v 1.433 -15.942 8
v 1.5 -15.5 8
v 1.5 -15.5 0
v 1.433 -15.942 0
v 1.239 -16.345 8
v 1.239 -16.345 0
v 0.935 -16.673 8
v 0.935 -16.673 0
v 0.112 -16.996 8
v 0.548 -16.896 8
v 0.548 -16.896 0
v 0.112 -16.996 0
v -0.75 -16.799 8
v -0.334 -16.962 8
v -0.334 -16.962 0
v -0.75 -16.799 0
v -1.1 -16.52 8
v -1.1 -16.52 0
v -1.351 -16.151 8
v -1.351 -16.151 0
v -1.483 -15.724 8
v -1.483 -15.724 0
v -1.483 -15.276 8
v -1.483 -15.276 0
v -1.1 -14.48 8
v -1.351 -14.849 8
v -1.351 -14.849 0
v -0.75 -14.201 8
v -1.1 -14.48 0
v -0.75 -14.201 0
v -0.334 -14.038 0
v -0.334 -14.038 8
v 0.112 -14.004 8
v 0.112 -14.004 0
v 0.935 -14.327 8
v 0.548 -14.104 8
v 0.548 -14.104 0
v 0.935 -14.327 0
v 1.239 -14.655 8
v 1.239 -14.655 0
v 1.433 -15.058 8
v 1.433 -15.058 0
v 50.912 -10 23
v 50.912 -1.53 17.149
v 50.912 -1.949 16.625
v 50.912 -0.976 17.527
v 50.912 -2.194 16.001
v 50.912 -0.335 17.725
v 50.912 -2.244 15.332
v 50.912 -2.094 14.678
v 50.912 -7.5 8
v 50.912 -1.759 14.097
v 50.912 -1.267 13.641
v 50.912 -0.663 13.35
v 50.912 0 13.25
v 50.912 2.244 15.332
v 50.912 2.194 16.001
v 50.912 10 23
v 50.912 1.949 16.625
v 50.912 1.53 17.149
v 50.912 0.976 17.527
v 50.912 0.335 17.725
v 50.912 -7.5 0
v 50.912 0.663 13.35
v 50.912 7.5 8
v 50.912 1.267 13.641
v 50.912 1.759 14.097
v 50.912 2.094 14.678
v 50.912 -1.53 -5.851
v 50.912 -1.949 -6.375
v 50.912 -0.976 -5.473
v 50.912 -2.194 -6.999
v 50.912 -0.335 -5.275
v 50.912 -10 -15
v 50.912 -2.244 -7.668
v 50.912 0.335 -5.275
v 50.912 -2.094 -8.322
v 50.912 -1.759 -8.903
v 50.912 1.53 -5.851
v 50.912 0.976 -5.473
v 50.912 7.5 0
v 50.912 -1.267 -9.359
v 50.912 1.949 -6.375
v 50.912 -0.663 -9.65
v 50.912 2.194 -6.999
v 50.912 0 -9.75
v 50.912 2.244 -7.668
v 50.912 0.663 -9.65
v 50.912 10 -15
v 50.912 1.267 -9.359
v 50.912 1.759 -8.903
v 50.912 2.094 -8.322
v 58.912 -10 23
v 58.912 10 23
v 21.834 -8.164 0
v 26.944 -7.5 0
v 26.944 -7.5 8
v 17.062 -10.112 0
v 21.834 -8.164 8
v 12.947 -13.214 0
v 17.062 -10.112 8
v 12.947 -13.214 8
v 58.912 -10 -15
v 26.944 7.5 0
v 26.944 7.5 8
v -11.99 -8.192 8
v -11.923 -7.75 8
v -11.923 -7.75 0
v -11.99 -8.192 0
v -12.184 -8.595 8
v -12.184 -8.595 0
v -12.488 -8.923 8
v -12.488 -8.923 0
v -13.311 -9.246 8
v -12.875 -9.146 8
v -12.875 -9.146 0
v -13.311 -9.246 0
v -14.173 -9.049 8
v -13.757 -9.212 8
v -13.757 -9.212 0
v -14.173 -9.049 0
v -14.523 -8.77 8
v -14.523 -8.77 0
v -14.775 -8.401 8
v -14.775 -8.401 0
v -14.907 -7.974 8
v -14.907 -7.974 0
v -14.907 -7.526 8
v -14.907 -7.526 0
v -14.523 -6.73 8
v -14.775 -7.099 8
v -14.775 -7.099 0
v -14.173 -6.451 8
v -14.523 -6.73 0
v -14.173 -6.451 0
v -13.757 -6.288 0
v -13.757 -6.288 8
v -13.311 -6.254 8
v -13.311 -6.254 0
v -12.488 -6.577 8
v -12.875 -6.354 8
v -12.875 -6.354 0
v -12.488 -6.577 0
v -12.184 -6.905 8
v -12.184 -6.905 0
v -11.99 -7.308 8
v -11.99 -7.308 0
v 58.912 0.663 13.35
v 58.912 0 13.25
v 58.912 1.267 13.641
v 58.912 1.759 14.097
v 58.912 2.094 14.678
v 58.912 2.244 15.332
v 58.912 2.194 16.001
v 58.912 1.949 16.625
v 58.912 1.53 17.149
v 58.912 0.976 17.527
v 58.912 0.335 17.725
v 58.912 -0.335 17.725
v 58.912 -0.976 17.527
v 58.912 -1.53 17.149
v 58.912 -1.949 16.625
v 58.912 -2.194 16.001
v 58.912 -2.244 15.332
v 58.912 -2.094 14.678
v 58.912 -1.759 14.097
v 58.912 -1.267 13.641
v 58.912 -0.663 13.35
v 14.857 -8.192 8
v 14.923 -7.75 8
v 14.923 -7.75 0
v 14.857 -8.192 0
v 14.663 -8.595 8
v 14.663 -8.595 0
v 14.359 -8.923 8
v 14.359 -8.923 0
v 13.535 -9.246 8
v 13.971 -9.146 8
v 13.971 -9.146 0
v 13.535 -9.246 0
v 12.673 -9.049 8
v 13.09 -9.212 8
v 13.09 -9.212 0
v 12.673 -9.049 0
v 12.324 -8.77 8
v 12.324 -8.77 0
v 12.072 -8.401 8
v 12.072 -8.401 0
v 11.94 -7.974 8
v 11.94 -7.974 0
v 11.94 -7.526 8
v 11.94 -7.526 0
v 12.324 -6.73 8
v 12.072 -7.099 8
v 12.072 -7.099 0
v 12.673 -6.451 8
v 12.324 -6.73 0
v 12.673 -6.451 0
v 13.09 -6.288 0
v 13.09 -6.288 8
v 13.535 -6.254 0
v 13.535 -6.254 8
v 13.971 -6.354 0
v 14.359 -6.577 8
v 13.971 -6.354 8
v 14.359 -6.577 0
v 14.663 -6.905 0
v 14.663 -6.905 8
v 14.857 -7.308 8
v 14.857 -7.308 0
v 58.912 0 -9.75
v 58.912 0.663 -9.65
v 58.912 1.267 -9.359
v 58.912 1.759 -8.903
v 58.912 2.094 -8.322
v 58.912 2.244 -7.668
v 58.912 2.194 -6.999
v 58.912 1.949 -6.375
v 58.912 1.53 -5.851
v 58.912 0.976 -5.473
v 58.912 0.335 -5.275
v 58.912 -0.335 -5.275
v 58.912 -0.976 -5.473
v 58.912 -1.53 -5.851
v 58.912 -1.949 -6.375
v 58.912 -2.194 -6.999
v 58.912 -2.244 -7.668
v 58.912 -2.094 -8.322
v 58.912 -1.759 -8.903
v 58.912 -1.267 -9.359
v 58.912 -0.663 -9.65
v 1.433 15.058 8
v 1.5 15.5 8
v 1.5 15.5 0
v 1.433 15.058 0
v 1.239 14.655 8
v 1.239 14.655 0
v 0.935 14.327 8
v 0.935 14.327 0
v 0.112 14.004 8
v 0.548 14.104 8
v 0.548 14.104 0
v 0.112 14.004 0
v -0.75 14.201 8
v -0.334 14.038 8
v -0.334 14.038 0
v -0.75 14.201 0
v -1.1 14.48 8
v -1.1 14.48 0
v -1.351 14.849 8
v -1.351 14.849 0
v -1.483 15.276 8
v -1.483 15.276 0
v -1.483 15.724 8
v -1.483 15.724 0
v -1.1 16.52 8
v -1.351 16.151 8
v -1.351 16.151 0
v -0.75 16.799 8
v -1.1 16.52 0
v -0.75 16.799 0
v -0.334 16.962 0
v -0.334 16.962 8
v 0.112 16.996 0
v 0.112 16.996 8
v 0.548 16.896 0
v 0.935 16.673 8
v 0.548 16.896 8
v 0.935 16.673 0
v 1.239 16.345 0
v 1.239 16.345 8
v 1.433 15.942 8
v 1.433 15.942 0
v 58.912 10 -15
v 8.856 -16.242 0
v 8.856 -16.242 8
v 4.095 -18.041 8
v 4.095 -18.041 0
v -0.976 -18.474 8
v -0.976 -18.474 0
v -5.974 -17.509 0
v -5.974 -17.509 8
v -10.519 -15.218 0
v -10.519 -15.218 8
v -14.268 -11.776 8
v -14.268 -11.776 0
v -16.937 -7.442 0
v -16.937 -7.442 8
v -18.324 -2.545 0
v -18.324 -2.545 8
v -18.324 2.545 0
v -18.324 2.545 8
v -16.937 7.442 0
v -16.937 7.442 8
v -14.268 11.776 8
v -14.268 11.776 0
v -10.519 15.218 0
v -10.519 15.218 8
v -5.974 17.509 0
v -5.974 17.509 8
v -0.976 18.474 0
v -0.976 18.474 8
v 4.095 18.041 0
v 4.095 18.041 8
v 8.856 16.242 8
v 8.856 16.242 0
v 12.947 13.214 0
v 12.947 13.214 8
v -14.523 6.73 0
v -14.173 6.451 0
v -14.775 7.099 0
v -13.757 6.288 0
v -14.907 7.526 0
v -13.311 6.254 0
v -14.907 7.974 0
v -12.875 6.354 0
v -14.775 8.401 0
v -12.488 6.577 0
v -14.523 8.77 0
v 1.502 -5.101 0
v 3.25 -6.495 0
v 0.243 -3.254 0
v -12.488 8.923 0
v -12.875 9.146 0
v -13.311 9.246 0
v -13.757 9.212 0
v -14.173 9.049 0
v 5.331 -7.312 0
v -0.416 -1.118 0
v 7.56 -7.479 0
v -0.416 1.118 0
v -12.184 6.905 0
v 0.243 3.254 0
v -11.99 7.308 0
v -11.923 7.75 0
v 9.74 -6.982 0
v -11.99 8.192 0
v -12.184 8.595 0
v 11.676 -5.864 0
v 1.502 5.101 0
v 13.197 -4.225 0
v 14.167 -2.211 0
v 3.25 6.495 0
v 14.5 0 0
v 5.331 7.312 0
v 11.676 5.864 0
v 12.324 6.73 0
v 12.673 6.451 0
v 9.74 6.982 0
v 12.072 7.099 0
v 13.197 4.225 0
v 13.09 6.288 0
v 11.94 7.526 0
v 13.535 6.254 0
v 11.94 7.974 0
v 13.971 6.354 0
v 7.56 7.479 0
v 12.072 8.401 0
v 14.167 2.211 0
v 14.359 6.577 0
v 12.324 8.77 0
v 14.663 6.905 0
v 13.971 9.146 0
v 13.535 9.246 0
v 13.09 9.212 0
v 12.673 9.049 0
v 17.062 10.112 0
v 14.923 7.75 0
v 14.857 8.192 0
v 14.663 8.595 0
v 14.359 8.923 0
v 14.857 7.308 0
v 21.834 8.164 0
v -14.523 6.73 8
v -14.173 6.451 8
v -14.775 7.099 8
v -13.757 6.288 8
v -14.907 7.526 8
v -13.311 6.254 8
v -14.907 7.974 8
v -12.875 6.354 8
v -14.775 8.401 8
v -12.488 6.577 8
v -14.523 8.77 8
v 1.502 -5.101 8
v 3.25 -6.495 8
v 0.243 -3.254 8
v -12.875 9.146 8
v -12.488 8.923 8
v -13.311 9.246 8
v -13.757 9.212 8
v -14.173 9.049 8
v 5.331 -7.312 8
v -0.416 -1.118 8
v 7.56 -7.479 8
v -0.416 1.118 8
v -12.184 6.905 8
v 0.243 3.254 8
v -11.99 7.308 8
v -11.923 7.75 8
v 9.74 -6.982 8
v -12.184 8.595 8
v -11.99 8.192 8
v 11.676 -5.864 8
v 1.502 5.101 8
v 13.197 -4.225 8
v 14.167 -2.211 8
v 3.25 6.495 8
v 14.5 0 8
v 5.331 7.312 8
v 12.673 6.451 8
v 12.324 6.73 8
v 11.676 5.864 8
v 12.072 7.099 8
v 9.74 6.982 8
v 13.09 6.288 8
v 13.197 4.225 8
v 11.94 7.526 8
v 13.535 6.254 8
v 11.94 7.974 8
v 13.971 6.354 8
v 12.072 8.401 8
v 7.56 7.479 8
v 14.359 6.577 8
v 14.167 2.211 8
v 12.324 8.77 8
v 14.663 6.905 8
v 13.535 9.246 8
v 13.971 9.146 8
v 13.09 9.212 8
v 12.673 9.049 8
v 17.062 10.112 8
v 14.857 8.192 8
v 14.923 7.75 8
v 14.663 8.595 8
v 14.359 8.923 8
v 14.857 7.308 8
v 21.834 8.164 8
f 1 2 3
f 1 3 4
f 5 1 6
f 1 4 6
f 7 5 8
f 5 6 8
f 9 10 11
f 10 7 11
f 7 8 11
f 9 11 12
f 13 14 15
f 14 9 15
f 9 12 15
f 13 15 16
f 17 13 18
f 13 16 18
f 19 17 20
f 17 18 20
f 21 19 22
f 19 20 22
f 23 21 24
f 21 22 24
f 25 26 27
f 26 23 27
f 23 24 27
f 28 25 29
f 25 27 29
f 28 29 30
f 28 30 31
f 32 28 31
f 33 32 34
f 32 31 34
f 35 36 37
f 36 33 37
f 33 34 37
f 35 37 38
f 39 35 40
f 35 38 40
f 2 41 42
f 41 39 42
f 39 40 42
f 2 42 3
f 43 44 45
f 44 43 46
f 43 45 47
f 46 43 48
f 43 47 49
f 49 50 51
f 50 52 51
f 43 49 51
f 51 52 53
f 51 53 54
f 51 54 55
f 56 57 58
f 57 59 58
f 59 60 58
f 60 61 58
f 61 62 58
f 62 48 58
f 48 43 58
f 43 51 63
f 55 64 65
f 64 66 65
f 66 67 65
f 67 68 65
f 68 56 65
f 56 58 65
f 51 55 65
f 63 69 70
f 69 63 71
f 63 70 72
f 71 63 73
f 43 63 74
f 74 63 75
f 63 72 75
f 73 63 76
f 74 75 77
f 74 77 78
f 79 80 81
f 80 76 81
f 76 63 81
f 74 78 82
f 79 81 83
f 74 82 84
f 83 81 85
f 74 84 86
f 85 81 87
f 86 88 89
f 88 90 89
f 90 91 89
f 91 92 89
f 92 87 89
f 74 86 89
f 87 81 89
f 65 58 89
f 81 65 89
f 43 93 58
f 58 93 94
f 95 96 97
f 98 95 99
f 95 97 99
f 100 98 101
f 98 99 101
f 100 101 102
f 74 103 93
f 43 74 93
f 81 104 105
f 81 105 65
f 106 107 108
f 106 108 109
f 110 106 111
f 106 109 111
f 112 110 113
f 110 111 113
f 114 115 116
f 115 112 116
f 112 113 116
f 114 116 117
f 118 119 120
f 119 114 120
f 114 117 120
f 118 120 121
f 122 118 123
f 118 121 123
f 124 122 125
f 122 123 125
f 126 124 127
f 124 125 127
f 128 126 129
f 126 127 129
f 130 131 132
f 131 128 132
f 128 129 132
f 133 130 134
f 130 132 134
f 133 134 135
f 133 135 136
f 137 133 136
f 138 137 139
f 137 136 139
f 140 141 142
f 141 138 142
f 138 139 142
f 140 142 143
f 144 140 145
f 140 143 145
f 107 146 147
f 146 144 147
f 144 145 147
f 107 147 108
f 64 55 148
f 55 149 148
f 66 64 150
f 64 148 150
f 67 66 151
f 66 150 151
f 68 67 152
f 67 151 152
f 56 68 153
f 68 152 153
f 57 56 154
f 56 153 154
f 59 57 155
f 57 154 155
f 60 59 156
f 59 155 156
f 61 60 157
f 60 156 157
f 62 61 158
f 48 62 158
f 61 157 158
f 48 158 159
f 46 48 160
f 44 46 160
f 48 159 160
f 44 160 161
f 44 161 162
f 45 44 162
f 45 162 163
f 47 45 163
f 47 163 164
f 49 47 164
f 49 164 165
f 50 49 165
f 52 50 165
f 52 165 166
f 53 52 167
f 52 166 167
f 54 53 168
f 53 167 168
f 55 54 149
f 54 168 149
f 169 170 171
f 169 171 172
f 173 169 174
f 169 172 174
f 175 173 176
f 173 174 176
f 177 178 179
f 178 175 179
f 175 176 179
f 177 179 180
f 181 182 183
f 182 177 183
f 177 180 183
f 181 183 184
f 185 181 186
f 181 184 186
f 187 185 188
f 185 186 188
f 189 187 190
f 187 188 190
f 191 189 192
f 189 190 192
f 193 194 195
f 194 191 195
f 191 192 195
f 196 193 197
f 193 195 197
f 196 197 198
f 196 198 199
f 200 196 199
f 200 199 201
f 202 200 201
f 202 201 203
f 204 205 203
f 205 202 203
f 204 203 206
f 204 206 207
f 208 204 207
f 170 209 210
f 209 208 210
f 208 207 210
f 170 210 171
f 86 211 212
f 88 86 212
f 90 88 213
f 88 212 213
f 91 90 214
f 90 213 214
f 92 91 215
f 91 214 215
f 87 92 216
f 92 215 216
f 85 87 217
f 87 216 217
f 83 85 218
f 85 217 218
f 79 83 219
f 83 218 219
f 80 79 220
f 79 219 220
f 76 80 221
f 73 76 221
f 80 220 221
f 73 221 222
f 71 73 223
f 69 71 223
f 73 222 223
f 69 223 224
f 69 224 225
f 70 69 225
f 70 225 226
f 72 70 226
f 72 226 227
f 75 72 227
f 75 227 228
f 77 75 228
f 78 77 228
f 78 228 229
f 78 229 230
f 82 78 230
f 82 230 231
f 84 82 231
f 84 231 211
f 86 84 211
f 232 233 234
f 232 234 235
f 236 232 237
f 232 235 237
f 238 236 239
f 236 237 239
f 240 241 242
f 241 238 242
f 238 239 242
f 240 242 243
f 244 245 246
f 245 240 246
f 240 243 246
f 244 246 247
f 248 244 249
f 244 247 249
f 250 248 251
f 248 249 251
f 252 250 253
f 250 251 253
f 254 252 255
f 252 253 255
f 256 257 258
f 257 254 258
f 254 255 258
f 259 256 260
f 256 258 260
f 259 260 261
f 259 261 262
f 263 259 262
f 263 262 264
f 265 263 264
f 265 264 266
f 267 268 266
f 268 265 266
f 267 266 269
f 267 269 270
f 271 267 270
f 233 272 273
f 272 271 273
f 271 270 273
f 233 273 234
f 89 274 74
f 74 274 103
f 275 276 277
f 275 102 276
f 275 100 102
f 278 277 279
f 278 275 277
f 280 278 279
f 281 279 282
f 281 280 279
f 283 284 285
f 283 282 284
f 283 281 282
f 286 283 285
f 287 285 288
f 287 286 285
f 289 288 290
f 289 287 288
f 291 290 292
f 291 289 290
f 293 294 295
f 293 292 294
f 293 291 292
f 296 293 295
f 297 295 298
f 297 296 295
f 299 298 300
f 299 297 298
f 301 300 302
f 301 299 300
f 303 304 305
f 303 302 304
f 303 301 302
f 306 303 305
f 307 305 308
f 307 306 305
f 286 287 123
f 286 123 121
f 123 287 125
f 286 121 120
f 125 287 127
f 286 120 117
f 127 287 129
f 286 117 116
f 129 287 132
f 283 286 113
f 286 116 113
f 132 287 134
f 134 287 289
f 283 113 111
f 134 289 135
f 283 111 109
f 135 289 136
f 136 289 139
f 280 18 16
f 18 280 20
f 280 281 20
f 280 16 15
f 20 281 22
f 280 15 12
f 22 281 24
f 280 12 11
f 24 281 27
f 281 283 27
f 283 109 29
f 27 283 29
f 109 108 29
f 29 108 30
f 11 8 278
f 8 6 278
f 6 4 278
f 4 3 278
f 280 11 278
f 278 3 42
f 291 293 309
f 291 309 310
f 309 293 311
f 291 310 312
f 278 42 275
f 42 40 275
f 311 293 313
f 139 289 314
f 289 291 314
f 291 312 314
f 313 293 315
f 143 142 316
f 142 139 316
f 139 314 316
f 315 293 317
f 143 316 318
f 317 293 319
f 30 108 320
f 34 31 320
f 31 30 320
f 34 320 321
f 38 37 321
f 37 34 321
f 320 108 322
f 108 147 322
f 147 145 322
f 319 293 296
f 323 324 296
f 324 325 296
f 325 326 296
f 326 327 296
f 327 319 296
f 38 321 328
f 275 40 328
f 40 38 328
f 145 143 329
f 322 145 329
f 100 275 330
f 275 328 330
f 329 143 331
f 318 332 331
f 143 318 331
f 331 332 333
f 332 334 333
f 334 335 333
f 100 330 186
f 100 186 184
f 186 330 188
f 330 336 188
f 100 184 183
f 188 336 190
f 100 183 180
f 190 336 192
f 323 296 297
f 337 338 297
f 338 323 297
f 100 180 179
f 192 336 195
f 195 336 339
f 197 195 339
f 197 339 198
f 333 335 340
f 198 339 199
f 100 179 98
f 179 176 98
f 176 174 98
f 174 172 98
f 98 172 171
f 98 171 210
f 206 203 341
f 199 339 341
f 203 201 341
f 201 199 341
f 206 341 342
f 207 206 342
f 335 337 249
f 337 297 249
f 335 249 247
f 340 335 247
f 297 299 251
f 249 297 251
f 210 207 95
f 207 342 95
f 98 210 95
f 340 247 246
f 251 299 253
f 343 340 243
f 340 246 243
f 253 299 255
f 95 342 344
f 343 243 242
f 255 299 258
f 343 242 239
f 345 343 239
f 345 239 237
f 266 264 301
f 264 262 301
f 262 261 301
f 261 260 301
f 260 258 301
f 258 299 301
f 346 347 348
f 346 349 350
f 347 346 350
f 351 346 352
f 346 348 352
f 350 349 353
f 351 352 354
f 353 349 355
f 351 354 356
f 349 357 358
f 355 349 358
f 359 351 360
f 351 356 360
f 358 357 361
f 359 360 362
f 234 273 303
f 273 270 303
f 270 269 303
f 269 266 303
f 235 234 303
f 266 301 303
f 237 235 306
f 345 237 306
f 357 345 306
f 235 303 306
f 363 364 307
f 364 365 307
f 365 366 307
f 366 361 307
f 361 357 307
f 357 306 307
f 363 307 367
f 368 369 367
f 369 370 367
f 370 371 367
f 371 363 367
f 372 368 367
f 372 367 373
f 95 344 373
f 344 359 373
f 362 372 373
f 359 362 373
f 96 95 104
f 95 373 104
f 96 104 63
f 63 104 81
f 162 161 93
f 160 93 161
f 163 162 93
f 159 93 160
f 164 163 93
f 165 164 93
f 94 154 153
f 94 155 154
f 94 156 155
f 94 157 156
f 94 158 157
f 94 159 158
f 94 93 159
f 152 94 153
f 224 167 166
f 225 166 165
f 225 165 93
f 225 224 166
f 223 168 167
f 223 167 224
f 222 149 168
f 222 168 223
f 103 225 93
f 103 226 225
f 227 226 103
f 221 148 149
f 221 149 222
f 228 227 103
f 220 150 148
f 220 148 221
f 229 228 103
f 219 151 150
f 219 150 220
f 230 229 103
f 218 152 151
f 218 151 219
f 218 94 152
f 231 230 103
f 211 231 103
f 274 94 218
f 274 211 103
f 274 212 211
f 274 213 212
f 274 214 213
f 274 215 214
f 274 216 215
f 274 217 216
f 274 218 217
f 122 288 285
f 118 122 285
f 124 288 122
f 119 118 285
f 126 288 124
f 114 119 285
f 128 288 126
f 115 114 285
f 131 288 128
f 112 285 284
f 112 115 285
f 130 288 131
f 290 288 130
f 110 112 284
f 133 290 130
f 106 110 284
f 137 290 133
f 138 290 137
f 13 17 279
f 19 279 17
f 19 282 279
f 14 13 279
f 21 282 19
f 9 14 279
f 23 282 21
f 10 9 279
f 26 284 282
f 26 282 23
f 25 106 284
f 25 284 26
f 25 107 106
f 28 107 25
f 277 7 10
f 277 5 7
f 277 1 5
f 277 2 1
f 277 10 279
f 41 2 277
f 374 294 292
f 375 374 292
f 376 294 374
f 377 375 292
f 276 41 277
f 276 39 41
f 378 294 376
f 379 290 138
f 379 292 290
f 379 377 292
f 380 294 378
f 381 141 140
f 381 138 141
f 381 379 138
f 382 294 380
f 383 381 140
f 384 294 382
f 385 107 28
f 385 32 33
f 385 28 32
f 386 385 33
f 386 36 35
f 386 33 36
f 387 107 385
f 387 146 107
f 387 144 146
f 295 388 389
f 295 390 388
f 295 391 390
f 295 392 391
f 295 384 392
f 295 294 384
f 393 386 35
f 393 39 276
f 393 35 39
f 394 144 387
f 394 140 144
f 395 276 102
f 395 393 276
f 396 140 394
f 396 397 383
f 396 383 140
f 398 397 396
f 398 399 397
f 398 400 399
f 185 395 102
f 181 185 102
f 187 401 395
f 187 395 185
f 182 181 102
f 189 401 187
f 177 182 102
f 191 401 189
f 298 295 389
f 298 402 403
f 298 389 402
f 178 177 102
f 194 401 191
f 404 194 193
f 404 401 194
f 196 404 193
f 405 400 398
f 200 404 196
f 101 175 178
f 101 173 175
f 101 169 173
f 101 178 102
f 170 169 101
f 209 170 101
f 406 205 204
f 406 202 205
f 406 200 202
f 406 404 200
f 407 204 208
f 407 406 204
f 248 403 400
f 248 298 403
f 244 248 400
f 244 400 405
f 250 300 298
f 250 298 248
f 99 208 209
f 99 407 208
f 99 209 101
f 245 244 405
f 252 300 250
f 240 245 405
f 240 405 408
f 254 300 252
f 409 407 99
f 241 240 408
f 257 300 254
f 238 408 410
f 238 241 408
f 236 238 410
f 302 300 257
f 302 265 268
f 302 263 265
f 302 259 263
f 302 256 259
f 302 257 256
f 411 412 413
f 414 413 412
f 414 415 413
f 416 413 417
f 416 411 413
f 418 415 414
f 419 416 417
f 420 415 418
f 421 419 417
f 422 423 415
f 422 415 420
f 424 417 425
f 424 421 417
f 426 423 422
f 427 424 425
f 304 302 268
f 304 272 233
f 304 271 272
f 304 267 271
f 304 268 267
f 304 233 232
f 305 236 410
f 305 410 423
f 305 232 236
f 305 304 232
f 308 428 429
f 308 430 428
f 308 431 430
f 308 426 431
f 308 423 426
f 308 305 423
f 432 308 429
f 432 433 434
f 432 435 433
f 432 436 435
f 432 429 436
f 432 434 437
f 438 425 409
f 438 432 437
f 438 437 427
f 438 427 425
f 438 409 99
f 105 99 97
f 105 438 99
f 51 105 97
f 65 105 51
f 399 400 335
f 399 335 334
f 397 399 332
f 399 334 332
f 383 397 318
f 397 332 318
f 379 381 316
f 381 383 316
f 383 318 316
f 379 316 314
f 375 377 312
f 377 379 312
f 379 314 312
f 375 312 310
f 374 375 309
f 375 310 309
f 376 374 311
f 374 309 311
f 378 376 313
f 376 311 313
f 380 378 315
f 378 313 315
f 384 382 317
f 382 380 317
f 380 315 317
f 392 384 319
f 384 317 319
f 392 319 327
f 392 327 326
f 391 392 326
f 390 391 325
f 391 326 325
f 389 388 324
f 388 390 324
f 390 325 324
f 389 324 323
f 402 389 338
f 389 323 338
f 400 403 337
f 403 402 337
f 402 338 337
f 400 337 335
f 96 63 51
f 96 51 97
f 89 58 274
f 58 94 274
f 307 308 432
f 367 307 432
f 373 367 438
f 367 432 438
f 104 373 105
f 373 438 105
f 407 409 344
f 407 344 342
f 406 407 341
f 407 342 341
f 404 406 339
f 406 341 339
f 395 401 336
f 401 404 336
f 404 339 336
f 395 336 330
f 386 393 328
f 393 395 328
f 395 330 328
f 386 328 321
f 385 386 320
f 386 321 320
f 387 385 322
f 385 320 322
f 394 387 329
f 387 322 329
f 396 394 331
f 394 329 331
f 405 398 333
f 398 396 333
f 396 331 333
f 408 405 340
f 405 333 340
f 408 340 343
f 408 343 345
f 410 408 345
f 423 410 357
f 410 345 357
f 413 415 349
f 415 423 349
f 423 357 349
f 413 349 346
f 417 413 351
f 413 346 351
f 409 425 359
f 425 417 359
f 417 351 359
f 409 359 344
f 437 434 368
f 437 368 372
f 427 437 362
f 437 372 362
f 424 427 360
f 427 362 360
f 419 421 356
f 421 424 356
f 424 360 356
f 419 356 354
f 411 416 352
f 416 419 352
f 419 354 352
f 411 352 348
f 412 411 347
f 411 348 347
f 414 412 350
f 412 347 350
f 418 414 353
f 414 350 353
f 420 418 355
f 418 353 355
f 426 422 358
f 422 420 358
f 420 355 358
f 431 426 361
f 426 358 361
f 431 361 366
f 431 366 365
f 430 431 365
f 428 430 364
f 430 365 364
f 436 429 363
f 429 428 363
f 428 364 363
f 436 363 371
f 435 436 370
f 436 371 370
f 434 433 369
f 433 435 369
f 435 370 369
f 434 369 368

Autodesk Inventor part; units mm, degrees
ref_plane "YZ Plane" through (0, 0, 0) normal (1, 0, 0) x (0, 1, 0)
ref_plane "XZ Plane" through (0, 0, 0) normal (0, 1, 0) x (-1, 0, 0)
ref_plane "XY Plane" through (0, 0, 0) normal (0, 0, 1) x (1, 0, 0)
sketch "Sketch1" plane through (0, 0, 0) normal (0, 0, 1) x (1, 0, 0)
  circle A0 centre (13.4234, -7.75) radius 1.5 projected
  circle A1 centre (-13.4234, -7.75) radius 1.5 projected
  circle A2 centre (0, 15.5) radius 1.5 projected
  circle A3 centre (-13.4234, 7.75) radius 1.5 projected
  circle A4 centre (0, -15.5) radius 1.5 projected
  circle A5 centre (13.4234, 7.75) radius 1.5 projected
  circle A6 centre (7, 0) radius 7 projected
  circle A7 centre (0, 0) radius 18.5 projected
  circle A8 centre (7, 0) radius 7.5
  line L0 (16.9115, 7.5) -> (51.9115, 7.5)
  line L1 (51.9115, 7.5) -> (51.9115, -7.5)
  line L2 (51.9115, -7.5) -> (16.9115, -7.5)
  line L3 (51.9115, -10) -> (58.9115, -10)
  line L4 (58.9115, -10) -> (58.9115, 10)
  line L5 (58.9115, 10) -> (51.9115, 10)
  line L6 (51.9115, 10) -> (51.9115, -10)
  point P0 (0, 0)
  point P1 (51.9115, -7.5)
  dimension "d0" = 15
  dimension "d1" = 35
  dimension "d2" = 20
  dimension "d3" = 7
  dimension "d4" = 2.5
  dimension "d5" = 0
extrude "Extrusion1" add sketch "Sketch1" along normal blind 8 contours A7 | A7 L0 L1 L2 | L6 L5 L4 L3 L1
sketch "Sketch2" plane through (58.9115, -10, 0) normal (1, 0, 0) x (0, 0, -1)
  line L0 (-23, 20) -> (15, 20)
  line L1 (15, 20) -> (15, 0)
  line L2 (15, 0) -> (-23, 0)
  line L3 (-23, 0) -> (-23, 20)
  line L4 (0, 20) -> (-8, 20) projected
  line L5 (-8, 0) -> (-8, 20) projected
  circle A0 centre (7.5, 10) radius 2.25
  circle A1 centre (-15.5, 10) radius 2.25
  point P0 (0, 10)
  dimension "d8" = 20
  dimension "d9" = 0
  dimension "d10" = 38
  dimension "d11" = 15
  dimension "d12" = 4.5
  dimension "d13" = 4.5
  dimension "d14" = 7.5
  dimension "d15" = 7.5
extrude "Extrusion2" add sketch "Sketch2" against normal blind 8
fillet "Fillet1" radius 20 2 edges at (16.9115, 7.5, 4) (16.9115, -7.5, 4)
equation "\"d14\" = d15"
properties part number "DCMotorHolder"
